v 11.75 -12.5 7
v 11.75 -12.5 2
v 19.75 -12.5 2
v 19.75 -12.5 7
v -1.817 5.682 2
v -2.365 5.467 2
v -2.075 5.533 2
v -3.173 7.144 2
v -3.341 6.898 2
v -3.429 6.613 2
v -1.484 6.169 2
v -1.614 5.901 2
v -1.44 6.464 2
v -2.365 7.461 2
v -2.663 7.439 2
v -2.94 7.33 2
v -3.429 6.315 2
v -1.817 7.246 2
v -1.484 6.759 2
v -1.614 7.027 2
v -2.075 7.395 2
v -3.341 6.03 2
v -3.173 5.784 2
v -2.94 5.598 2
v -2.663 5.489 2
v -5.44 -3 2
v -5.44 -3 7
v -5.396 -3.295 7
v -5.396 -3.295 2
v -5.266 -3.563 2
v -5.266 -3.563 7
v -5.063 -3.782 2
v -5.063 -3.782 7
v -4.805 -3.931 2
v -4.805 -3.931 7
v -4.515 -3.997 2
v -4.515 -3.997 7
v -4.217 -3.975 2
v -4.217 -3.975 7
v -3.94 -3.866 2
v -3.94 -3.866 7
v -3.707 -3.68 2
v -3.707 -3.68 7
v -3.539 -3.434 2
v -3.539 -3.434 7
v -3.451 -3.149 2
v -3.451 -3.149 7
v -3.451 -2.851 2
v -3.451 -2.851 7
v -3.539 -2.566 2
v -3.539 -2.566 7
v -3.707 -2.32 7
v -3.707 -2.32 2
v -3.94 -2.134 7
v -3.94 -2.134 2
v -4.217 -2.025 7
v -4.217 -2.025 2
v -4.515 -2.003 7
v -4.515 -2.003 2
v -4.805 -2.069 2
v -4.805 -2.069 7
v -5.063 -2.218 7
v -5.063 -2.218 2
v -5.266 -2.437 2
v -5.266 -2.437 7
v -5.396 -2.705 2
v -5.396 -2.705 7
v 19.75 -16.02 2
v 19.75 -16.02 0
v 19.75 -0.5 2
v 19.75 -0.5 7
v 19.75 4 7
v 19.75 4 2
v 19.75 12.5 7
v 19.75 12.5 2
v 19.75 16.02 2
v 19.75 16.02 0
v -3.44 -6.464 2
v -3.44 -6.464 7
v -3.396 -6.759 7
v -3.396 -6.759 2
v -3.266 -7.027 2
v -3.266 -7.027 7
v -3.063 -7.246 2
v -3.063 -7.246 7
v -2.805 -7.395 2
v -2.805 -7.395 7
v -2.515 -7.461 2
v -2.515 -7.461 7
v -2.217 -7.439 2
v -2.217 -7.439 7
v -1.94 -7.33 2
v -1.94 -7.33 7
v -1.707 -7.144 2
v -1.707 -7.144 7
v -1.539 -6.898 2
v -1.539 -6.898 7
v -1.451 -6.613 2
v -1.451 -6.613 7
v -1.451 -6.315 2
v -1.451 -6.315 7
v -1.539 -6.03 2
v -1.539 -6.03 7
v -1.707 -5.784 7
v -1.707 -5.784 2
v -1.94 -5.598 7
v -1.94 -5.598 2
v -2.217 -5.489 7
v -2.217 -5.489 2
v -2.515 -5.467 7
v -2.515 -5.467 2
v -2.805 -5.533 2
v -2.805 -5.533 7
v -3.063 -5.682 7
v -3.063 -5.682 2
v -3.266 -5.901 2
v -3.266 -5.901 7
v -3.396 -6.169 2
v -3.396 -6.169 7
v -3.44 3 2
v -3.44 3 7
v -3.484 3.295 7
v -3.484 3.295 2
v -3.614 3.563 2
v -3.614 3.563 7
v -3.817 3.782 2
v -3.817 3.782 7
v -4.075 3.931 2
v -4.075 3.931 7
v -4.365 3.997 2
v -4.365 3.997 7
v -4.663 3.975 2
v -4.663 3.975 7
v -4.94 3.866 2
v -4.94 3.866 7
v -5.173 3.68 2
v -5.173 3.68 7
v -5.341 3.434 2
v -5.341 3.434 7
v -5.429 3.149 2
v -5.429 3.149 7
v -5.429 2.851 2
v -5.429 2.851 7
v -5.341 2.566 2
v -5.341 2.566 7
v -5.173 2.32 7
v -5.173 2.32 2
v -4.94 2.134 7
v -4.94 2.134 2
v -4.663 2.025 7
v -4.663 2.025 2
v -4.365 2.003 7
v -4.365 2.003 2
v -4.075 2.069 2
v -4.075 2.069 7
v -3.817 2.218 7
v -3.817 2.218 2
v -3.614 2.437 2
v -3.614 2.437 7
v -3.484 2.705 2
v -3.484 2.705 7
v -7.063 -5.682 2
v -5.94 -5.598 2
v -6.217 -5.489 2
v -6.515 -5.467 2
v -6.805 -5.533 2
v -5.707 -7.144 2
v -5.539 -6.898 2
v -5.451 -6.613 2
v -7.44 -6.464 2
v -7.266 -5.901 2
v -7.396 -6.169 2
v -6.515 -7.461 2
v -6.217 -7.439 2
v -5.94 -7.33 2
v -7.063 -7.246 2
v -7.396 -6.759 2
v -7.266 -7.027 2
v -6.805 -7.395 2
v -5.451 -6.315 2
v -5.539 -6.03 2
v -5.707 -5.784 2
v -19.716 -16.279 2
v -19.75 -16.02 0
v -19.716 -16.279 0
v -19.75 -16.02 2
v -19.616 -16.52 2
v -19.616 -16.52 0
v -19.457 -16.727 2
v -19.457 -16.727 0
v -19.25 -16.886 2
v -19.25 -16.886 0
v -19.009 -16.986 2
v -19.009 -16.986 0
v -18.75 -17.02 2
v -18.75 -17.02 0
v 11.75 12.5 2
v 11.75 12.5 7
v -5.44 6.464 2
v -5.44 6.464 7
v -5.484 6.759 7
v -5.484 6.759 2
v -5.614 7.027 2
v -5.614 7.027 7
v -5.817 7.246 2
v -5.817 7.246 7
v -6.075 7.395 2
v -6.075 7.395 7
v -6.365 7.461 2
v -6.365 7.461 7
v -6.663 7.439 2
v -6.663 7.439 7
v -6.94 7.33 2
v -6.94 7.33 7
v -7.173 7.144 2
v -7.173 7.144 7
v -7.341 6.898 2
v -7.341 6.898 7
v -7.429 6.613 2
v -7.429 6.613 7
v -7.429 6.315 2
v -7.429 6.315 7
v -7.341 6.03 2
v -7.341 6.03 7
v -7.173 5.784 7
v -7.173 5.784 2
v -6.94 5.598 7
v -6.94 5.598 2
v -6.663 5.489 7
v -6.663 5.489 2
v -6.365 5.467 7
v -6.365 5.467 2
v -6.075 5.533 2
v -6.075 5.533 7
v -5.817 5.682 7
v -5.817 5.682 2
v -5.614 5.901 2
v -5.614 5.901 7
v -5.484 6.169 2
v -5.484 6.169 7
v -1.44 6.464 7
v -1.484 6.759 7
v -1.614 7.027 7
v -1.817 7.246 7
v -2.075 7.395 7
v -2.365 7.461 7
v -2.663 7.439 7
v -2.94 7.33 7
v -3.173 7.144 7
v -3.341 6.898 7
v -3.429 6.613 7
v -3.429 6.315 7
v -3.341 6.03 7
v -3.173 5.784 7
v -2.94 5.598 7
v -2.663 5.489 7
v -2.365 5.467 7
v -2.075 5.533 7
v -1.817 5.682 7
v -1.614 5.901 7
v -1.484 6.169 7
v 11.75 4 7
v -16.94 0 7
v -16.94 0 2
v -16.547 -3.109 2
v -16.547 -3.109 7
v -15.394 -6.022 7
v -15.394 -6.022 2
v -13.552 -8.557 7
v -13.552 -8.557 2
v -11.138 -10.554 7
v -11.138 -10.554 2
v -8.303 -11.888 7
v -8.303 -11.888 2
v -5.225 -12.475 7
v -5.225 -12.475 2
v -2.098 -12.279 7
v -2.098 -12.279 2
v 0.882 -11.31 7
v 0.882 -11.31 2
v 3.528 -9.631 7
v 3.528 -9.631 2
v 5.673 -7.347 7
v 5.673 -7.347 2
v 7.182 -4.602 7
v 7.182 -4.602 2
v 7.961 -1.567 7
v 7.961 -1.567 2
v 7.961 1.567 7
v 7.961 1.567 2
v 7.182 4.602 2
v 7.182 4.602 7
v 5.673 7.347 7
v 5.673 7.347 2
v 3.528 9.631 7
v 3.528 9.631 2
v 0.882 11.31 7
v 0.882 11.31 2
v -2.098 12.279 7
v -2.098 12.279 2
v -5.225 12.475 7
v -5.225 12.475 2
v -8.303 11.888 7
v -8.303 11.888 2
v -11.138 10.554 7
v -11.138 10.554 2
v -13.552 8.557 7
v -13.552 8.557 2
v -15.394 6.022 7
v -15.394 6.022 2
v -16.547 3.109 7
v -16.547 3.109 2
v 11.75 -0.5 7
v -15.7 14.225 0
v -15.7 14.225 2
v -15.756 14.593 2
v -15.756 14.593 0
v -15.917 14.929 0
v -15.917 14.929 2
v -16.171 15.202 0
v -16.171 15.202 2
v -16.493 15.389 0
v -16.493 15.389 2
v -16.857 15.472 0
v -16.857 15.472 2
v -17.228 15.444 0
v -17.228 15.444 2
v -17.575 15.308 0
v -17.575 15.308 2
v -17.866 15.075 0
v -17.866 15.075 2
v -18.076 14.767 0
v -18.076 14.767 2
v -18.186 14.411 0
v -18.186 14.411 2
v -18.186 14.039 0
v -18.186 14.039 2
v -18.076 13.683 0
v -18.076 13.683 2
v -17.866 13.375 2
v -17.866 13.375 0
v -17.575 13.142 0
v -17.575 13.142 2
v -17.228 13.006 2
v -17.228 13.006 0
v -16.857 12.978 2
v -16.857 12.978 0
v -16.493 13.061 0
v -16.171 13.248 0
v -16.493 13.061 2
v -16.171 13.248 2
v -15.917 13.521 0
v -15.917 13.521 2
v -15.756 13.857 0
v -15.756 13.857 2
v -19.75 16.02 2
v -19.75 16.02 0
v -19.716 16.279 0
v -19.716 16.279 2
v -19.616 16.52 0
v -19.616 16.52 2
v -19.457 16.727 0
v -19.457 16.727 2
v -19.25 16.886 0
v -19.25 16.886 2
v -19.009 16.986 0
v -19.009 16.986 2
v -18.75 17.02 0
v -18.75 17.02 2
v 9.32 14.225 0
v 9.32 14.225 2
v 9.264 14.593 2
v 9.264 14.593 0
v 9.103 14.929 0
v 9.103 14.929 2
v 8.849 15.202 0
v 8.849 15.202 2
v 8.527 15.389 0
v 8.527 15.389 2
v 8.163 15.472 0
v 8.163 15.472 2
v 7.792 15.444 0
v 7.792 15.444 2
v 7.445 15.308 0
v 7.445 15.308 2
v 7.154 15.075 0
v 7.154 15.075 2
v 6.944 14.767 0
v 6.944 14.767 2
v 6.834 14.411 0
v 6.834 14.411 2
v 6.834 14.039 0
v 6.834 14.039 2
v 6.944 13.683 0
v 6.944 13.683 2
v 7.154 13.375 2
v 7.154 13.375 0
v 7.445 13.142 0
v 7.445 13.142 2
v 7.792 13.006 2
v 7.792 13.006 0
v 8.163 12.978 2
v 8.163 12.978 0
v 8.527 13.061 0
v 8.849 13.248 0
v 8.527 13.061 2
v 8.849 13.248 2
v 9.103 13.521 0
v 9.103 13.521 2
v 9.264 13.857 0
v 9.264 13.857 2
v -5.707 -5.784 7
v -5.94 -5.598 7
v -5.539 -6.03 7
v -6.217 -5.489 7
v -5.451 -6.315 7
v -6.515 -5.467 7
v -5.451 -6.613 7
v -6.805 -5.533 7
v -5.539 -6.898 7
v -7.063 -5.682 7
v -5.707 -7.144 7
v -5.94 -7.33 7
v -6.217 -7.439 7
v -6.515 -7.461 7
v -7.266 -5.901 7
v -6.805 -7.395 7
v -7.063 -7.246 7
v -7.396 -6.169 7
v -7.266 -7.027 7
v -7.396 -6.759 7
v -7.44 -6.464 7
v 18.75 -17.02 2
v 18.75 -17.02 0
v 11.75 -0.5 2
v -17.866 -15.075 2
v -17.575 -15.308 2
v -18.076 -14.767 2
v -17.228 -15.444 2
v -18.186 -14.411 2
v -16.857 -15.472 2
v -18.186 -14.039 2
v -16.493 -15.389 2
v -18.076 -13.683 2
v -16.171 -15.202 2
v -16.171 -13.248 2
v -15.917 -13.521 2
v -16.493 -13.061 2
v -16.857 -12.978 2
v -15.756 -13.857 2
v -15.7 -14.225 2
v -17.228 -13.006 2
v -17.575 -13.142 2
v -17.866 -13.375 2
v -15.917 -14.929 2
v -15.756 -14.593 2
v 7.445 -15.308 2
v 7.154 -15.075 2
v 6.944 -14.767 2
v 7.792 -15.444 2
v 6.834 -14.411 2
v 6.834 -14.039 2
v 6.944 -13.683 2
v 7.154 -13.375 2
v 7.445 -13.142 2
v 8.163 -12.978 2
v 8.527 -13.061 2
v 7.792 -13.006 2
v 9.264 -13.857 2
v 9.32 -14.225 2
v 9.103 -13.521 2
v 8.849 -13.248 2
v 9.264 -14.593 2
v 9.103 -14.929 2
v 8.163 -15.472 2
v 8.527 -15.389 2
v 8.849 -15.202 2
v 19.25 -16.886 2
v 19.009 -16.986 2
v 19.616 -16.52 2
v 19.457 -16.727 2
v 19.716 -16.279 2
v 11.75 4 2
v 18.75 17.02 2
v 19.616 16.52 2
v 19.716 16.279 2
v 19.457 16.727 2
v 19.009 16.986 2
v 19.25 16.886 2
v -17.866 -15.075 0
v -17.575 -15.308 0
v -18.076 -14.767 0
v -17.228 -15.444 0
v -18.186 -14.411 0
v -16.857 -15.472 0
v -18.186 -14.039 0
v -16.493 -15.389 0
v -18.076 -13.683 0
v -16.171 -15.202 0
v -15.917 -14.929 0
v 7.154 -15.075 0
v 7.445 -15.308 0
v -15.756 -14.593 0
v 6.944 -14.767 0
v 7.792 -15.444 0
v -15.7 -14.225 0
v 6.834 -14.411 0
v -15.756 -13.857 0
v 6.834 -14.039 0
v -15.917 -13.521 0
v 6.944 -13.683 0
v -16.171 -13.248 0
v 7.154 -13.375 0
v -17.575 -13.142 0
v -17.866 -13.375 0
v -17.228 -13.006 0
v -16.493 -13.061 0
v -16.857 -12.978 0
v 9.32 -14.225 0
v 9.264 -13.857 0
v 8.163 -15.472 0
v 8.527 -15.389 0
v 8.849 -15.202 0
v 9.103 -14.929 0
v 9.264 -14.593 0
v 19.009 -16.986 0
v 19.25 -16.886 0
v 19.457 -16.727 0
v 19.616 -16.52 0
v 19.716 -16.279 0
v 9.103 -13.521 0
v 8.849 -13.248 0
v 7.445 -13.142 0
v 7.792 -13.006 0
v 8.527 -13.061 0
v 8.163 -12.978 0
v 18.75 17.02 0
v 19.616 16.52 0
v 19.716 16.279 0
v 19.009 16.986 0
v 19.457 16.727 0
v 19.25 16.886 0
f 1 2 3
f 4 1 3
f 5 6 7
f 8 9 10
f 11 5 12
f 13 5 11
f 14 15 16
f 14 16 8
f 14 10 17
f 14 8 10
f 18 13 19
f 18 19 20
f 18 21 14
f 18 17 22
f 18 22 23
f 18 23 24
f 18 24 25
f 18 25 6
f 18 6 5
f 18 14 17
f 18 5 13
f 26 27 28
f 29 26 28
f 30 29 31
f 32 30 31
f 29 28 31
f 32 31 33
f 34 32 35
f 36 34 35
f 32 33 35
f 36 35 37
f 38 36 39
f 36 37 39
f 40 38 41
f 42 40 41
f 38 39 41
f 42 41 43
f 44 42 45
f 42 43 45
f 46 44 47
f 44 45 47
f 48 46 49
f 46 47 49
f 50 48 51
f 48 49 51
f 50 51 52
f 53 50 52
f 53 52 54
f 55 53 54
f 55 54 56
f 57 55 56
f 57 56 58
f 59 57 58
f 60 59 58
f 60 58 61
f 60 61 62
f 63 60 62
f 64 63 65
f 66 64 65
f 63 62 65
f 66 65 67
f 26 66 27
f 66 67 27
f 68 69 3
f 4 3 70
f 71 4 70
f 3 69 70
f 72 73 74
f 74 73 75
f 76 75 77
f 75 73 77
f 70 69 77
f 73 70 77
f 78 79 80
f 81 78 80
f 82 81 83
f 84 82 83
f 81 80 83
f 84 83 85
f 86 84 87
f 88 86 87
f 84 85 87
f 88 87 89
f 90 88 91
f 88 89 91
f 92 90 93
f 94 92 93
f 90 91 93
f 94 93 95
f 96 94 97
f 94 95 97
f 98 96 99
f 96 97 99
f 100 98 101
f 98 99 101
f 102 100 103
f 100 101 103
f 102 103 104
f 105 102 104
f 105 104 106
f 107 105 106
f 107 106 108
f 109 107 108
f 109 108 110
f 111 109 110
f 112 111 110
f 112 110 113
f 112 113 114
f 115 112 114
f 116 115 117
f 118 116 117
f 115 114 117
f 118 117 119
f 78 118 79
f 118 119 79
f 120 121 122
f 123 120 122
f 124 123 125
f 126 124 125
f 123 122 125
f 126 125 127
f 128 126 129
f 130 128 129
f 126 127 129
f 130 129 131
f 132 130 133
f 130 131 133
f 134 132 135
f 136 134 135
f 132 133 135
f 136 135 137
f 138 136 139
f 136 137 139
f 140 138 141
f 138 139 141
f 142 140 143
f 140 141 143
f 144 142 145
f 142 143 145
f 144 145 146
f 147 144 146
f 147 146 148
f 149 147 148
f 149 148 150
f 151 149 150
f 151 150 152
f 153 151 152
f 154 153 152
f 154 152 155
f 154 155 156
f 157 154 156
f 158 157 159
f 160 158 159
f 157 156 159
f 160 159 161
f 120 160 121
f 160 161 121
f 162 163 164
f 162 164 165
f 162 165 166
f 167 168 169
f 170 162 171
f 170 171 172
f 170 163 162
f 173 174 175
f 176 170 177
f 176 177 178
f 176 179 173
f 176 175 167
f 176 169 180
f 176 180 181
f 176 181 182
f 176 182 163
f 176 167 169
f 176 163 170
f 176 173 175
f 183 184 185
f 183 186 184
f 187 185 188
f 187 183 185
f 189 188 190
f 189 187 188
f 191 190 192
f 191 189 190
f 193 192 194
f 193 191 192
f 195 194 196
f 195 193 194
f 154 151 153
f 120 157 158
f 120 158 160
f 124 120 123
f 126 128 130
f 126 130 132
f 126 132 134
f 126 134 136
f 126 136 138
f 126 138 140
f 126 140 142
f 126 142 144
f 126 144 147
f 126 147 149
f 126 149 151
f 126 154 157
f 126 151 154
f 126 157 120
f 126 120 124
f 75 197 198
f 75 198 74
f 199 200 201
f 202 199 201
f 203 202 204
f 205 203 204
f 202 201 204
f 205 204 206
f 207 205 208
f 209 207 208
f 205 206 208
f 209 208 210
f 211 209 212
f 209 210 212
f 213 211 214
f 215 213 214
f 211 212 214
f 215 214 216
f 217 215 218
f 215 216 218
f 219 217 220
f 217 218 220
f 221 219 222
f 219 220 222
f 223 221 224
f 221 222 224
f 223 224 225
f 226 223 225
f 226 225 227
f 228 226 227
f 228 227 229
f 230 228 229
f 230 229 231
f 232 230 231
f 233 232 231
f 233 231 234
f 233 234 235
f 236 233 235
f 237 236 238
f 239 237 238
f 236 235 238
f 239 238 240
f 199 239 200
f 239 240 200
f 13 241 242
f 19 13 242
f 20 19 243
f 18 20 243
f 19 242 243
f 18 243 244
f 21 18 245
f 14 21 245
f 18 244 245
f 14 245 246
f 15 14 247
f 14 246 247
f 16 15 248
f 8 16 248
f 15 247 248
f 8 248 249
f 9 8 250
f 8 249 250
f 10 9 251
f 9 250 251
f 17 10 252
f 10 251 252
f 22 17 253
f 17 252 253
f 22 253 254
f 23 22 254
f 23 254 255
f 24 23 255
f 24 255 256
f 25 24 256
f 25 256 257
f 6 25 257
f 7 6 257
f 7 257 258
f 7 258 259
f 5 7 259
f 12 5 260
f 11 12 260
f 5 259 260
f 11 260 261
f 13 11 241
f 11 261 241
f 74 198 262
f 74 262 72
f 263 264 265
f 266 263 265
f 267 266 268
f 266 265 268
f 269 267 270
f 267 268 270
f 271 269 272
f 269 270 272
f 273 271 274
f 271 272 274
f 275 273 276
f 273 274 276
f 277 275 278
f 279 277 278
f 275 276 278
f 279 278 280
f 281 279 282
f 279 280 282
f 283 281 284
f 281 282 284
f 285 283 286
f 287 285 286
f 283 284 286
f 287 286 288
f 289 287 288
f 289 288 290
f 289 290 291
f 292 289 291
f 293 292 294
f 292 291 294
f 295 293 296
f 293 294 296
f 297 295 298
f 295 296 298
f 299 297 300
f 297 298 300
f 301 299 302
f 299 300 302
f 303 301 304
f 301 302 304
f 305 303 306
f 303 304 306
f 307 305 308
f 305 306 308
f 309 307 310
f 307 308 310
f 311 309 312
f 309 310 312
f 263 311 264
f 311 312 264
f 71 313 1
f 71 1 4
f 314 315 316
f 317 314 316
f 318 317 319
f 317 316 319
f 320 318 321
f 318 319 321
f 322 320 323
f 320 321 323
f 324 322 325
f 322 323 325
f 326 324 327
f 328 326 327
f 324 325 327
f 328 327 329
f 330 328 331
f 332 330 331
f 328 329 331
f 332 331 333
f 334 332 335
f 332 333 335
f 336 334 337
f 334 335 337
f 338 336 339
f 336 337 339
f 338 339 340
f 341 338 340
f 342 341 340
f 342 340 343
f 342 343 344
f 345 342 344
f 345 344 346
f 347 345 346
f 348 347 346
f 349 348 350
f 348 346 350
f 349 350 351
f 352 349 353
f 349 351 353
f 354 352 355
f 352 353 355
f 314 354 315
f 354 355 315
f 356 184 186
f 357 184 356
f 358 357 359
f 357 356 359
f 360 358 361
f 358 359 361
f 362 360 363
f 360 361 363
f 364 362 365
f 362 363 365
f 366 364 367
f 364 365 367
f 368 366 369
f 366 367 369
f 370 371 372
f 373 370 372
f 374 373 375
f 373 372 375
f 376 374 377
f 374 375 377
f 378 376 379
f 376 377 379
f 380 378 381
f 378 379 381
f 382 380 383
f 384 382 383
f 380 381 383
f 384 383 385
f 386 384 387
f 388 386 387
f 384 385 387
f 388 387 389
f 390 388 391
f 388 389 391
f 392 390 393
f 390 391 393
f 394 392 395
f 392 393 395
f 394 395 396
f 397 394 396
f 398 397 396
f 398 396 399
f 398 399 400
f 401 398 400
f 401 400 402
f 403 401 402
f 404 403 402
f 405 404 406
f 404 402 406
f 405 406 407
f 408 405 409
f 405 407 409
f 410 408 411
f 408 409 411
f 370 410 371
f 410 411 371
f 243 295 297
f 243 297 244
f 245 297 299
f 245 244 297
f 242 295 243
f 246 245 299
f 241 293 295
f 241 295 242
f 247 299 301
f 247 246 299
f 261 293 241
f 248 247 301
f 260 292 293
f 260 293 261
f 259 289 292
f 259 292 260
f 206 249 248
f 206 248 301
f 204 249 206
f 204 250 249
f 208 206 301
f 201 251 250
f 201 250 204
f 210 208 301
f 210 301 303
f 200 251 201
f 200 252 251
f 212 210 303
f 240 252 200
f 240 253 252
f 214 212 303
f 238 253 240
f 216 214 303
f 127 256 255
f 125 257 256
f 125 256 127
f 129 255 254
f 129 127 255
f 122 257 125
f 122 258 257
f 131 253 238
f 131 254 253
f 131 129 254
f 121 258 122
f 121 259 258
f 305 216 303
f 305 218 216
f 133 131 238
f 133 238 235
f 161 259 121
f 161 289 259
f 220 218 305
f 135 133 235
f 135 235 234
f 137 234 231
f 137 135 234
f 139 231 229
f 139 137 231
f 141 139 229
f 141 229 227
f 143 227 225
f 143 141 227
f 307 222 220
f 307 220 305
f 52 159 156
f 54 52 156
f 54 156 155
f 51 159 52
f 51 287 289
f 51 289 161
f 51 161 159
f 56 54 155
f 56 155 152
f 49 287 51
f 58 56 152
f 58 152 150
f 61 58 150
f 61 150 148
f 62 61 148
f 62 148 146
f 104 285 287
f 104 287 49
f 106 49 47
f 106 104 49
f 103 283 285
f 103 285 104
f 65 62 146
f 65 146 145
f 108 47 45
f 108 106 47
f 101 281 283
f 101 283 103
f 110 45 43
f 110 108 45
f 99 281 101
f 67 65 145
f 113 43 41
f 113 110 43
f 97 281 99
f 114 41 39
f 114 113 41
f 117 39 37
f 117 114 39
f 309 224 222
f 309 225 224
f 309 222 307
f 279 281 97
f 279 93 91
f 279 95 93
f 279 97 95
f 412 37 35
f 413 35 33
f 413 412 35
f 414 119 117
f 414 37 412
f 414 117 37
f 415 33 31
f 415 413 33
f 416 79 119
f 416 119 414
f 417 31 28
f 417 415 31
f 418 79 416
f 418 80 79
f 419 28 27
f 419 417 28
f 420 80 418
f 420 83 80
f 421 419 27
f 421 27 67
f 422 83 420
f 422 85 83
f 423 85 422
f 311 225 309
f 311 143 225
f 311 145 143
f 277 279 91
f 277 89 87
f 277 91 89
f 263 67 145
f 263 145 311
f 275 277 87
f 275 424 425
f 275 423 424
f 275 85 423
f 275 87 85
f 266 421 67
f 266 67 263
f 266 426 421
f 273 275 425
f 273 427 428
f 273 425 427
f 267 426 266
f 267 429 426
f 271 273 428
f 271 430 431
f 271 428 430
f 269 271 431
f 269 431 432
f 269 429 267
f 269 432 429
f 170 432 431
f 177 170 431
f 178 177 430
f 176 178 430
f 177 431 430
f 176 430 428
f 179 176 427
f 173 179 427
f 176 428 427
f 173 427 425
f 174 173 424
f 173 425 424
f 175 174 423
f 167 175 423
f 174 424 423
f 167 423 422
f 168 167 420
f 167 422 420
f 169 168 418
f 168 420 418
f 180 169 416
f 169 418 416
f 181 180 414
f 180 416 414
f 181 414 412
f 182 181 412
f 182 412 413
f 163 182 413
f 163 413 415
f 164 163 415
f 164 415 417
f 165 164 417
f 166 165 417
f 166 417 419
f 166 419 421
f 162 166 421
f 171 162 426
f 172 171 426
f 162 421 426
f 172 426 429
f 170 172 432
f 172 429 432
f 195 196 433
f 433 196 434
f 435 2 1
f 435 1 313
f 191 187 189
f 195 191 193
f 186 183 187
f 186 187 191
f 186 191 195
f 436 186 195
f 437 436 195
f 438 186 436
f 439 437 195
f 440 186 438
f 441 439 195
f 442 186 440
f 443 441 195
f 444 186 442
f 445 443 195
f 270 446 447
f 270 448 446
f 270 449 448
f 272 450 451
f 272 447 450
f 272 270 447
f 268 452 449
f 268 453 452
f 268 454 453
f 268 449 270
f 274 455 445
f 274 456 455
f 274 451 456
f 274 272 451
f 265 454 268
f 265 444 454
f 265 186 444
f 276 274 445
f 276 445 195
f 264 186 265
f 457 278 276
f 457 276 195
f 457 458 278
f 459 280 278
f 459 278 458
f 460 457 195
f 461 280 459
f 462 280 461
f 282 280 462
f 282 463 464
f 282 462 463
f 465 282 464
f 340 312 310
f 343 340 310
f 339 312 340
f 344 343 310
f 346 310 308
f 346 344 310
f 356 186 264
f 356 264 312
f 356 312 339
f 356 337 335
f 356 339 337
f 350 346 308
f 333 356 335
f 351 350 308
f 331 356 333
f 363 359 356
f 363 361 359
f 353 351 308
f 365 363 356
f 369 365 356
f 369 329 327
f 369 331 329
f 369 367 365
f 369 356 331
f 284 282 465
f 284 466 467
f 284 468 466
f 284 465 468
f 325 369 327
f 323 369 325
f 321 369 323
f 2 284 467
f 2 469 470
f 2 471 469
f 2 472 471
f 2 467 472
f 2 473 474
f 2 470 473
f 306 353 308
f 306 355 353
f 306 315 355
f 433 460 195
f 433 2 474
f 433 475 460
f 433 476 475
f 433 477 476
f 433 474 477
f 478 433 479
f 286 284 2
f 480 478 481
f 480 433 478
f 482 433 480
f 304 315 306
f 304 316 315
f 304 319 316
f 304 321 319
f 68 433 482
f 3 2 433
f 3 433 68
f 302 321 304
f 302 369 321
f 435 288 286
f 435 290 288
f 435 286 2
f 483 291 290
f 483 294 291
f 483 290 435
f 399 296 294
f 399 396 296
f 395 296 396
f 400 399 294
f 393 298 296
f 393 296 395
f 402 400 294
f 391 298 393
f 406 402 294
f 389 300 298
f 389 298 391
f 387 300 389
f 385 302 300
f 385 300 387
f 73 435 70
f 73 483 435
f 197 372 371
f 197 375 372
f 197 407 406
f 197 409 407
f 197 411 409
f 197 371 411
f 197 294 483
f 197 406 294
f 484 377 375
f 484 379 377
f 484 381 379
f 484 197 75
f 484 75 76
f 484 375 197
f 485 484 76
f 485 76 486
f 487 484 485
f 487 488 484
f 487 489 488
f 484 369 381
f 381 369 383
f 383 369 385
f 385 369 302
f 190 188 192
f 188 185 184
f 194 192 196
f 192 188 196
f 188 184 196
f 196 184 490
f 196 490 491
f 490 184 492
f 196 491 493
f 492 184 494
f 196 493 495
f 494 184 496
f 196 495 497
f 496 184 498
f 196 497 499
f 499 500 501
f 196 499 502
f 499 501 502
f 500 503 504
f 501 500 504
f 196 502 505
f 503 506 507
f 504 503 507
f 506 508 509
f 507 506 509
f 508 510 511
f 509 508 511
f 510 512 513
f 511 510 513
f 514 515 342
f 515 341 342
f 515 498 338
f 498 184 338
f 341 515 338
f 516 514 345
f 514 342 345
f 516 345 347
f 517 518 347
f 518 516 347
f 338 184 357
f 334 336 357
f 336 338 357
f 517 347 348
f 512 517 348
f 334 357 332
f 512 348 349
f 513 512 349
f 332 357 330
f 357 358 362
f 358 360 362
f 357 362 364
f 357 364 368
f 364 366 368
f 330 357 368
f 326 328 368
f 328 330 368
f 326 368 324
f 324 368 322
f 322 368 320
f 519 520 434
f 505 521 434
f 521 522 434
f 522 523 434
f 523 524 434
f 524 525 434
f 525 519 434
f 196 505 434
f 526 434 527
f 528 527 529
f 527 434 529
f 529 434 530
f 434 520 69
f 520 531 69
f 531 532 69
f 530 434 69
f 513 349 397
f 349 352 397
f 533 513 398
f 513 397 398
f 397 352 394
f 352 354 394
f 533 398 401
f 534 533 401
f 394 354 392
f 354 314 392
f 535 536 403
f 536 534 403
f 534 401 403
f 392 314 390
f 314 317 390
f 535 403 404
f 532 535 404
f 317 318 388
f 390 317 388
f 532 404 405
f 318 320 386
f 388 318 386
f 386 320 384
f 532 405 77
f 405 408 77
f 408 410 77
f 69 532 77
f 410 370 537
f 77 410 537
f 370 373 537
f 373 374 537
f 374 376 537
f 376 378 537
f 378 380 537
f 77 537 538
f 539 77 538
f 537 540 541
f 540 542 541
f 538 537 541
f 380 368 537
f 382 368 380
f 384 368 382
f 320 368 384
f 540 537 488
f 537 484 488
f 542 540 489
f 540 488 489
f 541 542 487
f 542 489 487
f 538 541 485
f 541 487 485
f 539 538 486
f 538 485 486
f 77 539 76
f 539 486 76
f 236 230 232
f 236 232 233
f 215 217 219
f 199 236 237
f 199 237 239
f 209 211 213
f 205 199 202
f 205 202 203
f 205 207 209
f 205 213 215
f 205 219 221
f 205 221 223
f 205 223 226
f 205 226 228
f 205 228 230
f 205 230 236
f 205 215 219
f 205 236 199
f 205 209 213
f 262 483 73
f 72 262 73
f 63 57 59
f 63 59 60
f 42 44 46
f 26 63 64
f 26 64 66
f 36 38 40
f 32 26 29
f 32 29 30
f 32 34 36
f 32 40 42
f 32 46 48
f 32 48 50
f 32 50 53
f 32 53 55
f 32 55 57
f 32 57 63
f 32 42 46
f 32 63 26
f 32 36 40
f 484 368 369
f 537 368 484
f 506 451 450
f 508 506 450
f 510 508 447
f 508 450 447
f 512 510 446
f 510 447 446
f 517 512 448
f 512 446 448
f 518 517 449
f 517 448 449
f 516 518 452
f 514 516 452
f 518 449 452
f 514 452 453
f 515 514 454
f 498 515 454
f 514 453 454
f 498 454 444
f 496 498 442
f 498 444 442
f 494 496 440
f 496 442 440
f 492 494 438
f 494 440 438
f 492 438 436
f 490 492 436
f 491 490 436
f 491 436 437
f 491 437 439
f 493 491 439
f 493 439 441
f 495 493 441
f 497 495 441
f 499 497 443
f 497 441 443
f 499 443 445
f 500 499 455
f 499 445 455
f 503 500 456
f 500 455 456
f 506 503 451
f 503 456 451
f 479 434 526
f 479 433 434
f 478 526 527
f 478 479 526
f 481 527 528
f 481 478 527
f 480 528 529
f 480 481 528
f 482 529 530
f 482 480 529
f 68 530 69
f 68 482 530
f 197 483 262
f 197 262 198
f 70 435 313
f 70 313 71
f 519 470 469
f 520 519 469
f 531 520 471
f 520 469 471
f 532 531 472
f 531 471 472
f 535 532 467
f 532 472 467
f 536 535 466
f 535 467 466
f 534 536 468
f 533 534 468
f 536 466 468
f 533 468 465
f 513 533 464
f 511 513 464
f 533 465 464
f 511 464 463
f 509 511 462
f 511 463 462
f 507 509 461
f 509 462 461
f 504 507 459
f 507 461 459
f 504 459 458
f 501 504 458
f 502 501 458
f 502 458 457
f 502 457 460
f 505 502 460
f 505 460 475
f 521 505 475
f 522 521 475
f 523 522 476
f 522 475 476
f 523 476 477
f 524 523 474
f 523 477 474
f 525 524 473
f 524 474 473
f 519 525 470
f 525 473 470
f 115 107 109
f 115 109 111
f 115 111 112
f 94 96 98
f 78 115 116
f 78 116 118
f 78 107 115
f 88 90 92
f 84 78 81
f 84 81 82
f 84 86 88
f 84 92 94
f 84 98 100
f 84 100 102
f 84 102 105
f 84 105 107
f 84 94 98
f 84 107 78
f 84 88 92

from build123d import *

# Parameters (mm, degrees)
SKETCH_1_W          = 39.5
SKETCH_1_H          = 34.04
EXTRUDE_1_DEPTH     = 2
SKETCH_2_R          = 1.25
CUT_EXTRUDE_1_DEPTH = 2
SKETCH_3_R          = 12.5
EXTRUDE_2_DEPTH     = 5
FILLET_1_R          = 1
SKETCH_4_W          = 8
SKETCH_4_H          = 8.5
SKETCH_4_H_2        = 12
EXTRUDE_3_DEPTH     = 5
SKETCH_5_R          = 1
CUT_EXTRUDE_2_DEPTH = 5


with BuildPart() as part:
    # 草图1 → 凸台-拉伸1 (new body)
    with BuildSketch(Plane.XY):
        Rectangle(SKETCH_1_W, SKETCH_1_H)
    extrude(amount=EXTRUDE_1_DEPTH)

    # 草图2 → 切除-拉伸1 (cut)
    with BuildSketch(Plane.XY.offset(2)):
        with Locations((-16.95, 14.225)):
            Circle(SKETCH_2_R)
        with Locations((-16.95, -14.225)):
            Circle(SKETCH_2_R)
        with Locations((8.07, 14.225)):
            Circle(SKETCH_2_R)
        with Locations((8.07, -14.225)):
            Circle(SKETCH_2_R)
    extrude(amount=-CUT_EXTRUDE_1_DEPTH, mode=Mode.SUBTRACT)

    # 草图3 → 凸台-拉伸2 (add)
    with BuildSketch(Plane.XY.offset(2)):
        with Locations(Location((-4.44, 0, 0), (0, 0, 180))):
            Circle(SKETCH_3_R)
    extrude(amount=EXTRUDE_2_DEPTH)

    # 圆角1
    fillet_1_edges = [part.edges().sort_by_distance(p)[0] for p in [
        (19.75, -17.02, 1),
        (-19.75, -17.02, 1),
        (-19.75, 17.02, 1),
        (19.75, 17.02, 1),
    ]]
    fillet(fillet_1_edges, radius=FILLET_1_R)

    # 草图4 → 凸台-拉伸3 (add)
    with BuildSketch(Plane.XY.offset(2)):
        with Locations((15.75, 8.25)):
            Rectangle(SKETCH_4_W, SKETCH_4_H)
        with Locations((15.75, -6.5)):
            Rectangle(SKETCH_4_W, SKETCH_4_H_2)
    extrude(amount=EXTRUDE_3_DEPTH)

    # 草图5 → 切除-拉伸2 (cut)
    with BuildSketch(Plane.XY.offset(7)):
        with Locations((-6.44, 6.464101615)):
            Circle(SKETCH_5_R)
        with Locations((-2.44, 6.464101615)):
            Circle(SKETCH_5_R)
        with Locations((-4.44, 3)):
            Circle(SKETCH_5_R)
        with Locations(Location((-4.44, -3, 0), (0, 0, 180))):
            Circle(SKETCH_5_R)
        with Locations(Location((-2.44, -6.464101615, 0), (0, 0, 180))):
            Circle(SKETCH_5_R)
        with Locations(Location((-6.44, -6.464101615, 0), (0, 0, 180))):
            Circle(SKETCH_5_R)
    extrude(amount=-CUT_EXTRUDE_2_DEPTH, mode=Mode.SUBTRACT)


solid = part.part
